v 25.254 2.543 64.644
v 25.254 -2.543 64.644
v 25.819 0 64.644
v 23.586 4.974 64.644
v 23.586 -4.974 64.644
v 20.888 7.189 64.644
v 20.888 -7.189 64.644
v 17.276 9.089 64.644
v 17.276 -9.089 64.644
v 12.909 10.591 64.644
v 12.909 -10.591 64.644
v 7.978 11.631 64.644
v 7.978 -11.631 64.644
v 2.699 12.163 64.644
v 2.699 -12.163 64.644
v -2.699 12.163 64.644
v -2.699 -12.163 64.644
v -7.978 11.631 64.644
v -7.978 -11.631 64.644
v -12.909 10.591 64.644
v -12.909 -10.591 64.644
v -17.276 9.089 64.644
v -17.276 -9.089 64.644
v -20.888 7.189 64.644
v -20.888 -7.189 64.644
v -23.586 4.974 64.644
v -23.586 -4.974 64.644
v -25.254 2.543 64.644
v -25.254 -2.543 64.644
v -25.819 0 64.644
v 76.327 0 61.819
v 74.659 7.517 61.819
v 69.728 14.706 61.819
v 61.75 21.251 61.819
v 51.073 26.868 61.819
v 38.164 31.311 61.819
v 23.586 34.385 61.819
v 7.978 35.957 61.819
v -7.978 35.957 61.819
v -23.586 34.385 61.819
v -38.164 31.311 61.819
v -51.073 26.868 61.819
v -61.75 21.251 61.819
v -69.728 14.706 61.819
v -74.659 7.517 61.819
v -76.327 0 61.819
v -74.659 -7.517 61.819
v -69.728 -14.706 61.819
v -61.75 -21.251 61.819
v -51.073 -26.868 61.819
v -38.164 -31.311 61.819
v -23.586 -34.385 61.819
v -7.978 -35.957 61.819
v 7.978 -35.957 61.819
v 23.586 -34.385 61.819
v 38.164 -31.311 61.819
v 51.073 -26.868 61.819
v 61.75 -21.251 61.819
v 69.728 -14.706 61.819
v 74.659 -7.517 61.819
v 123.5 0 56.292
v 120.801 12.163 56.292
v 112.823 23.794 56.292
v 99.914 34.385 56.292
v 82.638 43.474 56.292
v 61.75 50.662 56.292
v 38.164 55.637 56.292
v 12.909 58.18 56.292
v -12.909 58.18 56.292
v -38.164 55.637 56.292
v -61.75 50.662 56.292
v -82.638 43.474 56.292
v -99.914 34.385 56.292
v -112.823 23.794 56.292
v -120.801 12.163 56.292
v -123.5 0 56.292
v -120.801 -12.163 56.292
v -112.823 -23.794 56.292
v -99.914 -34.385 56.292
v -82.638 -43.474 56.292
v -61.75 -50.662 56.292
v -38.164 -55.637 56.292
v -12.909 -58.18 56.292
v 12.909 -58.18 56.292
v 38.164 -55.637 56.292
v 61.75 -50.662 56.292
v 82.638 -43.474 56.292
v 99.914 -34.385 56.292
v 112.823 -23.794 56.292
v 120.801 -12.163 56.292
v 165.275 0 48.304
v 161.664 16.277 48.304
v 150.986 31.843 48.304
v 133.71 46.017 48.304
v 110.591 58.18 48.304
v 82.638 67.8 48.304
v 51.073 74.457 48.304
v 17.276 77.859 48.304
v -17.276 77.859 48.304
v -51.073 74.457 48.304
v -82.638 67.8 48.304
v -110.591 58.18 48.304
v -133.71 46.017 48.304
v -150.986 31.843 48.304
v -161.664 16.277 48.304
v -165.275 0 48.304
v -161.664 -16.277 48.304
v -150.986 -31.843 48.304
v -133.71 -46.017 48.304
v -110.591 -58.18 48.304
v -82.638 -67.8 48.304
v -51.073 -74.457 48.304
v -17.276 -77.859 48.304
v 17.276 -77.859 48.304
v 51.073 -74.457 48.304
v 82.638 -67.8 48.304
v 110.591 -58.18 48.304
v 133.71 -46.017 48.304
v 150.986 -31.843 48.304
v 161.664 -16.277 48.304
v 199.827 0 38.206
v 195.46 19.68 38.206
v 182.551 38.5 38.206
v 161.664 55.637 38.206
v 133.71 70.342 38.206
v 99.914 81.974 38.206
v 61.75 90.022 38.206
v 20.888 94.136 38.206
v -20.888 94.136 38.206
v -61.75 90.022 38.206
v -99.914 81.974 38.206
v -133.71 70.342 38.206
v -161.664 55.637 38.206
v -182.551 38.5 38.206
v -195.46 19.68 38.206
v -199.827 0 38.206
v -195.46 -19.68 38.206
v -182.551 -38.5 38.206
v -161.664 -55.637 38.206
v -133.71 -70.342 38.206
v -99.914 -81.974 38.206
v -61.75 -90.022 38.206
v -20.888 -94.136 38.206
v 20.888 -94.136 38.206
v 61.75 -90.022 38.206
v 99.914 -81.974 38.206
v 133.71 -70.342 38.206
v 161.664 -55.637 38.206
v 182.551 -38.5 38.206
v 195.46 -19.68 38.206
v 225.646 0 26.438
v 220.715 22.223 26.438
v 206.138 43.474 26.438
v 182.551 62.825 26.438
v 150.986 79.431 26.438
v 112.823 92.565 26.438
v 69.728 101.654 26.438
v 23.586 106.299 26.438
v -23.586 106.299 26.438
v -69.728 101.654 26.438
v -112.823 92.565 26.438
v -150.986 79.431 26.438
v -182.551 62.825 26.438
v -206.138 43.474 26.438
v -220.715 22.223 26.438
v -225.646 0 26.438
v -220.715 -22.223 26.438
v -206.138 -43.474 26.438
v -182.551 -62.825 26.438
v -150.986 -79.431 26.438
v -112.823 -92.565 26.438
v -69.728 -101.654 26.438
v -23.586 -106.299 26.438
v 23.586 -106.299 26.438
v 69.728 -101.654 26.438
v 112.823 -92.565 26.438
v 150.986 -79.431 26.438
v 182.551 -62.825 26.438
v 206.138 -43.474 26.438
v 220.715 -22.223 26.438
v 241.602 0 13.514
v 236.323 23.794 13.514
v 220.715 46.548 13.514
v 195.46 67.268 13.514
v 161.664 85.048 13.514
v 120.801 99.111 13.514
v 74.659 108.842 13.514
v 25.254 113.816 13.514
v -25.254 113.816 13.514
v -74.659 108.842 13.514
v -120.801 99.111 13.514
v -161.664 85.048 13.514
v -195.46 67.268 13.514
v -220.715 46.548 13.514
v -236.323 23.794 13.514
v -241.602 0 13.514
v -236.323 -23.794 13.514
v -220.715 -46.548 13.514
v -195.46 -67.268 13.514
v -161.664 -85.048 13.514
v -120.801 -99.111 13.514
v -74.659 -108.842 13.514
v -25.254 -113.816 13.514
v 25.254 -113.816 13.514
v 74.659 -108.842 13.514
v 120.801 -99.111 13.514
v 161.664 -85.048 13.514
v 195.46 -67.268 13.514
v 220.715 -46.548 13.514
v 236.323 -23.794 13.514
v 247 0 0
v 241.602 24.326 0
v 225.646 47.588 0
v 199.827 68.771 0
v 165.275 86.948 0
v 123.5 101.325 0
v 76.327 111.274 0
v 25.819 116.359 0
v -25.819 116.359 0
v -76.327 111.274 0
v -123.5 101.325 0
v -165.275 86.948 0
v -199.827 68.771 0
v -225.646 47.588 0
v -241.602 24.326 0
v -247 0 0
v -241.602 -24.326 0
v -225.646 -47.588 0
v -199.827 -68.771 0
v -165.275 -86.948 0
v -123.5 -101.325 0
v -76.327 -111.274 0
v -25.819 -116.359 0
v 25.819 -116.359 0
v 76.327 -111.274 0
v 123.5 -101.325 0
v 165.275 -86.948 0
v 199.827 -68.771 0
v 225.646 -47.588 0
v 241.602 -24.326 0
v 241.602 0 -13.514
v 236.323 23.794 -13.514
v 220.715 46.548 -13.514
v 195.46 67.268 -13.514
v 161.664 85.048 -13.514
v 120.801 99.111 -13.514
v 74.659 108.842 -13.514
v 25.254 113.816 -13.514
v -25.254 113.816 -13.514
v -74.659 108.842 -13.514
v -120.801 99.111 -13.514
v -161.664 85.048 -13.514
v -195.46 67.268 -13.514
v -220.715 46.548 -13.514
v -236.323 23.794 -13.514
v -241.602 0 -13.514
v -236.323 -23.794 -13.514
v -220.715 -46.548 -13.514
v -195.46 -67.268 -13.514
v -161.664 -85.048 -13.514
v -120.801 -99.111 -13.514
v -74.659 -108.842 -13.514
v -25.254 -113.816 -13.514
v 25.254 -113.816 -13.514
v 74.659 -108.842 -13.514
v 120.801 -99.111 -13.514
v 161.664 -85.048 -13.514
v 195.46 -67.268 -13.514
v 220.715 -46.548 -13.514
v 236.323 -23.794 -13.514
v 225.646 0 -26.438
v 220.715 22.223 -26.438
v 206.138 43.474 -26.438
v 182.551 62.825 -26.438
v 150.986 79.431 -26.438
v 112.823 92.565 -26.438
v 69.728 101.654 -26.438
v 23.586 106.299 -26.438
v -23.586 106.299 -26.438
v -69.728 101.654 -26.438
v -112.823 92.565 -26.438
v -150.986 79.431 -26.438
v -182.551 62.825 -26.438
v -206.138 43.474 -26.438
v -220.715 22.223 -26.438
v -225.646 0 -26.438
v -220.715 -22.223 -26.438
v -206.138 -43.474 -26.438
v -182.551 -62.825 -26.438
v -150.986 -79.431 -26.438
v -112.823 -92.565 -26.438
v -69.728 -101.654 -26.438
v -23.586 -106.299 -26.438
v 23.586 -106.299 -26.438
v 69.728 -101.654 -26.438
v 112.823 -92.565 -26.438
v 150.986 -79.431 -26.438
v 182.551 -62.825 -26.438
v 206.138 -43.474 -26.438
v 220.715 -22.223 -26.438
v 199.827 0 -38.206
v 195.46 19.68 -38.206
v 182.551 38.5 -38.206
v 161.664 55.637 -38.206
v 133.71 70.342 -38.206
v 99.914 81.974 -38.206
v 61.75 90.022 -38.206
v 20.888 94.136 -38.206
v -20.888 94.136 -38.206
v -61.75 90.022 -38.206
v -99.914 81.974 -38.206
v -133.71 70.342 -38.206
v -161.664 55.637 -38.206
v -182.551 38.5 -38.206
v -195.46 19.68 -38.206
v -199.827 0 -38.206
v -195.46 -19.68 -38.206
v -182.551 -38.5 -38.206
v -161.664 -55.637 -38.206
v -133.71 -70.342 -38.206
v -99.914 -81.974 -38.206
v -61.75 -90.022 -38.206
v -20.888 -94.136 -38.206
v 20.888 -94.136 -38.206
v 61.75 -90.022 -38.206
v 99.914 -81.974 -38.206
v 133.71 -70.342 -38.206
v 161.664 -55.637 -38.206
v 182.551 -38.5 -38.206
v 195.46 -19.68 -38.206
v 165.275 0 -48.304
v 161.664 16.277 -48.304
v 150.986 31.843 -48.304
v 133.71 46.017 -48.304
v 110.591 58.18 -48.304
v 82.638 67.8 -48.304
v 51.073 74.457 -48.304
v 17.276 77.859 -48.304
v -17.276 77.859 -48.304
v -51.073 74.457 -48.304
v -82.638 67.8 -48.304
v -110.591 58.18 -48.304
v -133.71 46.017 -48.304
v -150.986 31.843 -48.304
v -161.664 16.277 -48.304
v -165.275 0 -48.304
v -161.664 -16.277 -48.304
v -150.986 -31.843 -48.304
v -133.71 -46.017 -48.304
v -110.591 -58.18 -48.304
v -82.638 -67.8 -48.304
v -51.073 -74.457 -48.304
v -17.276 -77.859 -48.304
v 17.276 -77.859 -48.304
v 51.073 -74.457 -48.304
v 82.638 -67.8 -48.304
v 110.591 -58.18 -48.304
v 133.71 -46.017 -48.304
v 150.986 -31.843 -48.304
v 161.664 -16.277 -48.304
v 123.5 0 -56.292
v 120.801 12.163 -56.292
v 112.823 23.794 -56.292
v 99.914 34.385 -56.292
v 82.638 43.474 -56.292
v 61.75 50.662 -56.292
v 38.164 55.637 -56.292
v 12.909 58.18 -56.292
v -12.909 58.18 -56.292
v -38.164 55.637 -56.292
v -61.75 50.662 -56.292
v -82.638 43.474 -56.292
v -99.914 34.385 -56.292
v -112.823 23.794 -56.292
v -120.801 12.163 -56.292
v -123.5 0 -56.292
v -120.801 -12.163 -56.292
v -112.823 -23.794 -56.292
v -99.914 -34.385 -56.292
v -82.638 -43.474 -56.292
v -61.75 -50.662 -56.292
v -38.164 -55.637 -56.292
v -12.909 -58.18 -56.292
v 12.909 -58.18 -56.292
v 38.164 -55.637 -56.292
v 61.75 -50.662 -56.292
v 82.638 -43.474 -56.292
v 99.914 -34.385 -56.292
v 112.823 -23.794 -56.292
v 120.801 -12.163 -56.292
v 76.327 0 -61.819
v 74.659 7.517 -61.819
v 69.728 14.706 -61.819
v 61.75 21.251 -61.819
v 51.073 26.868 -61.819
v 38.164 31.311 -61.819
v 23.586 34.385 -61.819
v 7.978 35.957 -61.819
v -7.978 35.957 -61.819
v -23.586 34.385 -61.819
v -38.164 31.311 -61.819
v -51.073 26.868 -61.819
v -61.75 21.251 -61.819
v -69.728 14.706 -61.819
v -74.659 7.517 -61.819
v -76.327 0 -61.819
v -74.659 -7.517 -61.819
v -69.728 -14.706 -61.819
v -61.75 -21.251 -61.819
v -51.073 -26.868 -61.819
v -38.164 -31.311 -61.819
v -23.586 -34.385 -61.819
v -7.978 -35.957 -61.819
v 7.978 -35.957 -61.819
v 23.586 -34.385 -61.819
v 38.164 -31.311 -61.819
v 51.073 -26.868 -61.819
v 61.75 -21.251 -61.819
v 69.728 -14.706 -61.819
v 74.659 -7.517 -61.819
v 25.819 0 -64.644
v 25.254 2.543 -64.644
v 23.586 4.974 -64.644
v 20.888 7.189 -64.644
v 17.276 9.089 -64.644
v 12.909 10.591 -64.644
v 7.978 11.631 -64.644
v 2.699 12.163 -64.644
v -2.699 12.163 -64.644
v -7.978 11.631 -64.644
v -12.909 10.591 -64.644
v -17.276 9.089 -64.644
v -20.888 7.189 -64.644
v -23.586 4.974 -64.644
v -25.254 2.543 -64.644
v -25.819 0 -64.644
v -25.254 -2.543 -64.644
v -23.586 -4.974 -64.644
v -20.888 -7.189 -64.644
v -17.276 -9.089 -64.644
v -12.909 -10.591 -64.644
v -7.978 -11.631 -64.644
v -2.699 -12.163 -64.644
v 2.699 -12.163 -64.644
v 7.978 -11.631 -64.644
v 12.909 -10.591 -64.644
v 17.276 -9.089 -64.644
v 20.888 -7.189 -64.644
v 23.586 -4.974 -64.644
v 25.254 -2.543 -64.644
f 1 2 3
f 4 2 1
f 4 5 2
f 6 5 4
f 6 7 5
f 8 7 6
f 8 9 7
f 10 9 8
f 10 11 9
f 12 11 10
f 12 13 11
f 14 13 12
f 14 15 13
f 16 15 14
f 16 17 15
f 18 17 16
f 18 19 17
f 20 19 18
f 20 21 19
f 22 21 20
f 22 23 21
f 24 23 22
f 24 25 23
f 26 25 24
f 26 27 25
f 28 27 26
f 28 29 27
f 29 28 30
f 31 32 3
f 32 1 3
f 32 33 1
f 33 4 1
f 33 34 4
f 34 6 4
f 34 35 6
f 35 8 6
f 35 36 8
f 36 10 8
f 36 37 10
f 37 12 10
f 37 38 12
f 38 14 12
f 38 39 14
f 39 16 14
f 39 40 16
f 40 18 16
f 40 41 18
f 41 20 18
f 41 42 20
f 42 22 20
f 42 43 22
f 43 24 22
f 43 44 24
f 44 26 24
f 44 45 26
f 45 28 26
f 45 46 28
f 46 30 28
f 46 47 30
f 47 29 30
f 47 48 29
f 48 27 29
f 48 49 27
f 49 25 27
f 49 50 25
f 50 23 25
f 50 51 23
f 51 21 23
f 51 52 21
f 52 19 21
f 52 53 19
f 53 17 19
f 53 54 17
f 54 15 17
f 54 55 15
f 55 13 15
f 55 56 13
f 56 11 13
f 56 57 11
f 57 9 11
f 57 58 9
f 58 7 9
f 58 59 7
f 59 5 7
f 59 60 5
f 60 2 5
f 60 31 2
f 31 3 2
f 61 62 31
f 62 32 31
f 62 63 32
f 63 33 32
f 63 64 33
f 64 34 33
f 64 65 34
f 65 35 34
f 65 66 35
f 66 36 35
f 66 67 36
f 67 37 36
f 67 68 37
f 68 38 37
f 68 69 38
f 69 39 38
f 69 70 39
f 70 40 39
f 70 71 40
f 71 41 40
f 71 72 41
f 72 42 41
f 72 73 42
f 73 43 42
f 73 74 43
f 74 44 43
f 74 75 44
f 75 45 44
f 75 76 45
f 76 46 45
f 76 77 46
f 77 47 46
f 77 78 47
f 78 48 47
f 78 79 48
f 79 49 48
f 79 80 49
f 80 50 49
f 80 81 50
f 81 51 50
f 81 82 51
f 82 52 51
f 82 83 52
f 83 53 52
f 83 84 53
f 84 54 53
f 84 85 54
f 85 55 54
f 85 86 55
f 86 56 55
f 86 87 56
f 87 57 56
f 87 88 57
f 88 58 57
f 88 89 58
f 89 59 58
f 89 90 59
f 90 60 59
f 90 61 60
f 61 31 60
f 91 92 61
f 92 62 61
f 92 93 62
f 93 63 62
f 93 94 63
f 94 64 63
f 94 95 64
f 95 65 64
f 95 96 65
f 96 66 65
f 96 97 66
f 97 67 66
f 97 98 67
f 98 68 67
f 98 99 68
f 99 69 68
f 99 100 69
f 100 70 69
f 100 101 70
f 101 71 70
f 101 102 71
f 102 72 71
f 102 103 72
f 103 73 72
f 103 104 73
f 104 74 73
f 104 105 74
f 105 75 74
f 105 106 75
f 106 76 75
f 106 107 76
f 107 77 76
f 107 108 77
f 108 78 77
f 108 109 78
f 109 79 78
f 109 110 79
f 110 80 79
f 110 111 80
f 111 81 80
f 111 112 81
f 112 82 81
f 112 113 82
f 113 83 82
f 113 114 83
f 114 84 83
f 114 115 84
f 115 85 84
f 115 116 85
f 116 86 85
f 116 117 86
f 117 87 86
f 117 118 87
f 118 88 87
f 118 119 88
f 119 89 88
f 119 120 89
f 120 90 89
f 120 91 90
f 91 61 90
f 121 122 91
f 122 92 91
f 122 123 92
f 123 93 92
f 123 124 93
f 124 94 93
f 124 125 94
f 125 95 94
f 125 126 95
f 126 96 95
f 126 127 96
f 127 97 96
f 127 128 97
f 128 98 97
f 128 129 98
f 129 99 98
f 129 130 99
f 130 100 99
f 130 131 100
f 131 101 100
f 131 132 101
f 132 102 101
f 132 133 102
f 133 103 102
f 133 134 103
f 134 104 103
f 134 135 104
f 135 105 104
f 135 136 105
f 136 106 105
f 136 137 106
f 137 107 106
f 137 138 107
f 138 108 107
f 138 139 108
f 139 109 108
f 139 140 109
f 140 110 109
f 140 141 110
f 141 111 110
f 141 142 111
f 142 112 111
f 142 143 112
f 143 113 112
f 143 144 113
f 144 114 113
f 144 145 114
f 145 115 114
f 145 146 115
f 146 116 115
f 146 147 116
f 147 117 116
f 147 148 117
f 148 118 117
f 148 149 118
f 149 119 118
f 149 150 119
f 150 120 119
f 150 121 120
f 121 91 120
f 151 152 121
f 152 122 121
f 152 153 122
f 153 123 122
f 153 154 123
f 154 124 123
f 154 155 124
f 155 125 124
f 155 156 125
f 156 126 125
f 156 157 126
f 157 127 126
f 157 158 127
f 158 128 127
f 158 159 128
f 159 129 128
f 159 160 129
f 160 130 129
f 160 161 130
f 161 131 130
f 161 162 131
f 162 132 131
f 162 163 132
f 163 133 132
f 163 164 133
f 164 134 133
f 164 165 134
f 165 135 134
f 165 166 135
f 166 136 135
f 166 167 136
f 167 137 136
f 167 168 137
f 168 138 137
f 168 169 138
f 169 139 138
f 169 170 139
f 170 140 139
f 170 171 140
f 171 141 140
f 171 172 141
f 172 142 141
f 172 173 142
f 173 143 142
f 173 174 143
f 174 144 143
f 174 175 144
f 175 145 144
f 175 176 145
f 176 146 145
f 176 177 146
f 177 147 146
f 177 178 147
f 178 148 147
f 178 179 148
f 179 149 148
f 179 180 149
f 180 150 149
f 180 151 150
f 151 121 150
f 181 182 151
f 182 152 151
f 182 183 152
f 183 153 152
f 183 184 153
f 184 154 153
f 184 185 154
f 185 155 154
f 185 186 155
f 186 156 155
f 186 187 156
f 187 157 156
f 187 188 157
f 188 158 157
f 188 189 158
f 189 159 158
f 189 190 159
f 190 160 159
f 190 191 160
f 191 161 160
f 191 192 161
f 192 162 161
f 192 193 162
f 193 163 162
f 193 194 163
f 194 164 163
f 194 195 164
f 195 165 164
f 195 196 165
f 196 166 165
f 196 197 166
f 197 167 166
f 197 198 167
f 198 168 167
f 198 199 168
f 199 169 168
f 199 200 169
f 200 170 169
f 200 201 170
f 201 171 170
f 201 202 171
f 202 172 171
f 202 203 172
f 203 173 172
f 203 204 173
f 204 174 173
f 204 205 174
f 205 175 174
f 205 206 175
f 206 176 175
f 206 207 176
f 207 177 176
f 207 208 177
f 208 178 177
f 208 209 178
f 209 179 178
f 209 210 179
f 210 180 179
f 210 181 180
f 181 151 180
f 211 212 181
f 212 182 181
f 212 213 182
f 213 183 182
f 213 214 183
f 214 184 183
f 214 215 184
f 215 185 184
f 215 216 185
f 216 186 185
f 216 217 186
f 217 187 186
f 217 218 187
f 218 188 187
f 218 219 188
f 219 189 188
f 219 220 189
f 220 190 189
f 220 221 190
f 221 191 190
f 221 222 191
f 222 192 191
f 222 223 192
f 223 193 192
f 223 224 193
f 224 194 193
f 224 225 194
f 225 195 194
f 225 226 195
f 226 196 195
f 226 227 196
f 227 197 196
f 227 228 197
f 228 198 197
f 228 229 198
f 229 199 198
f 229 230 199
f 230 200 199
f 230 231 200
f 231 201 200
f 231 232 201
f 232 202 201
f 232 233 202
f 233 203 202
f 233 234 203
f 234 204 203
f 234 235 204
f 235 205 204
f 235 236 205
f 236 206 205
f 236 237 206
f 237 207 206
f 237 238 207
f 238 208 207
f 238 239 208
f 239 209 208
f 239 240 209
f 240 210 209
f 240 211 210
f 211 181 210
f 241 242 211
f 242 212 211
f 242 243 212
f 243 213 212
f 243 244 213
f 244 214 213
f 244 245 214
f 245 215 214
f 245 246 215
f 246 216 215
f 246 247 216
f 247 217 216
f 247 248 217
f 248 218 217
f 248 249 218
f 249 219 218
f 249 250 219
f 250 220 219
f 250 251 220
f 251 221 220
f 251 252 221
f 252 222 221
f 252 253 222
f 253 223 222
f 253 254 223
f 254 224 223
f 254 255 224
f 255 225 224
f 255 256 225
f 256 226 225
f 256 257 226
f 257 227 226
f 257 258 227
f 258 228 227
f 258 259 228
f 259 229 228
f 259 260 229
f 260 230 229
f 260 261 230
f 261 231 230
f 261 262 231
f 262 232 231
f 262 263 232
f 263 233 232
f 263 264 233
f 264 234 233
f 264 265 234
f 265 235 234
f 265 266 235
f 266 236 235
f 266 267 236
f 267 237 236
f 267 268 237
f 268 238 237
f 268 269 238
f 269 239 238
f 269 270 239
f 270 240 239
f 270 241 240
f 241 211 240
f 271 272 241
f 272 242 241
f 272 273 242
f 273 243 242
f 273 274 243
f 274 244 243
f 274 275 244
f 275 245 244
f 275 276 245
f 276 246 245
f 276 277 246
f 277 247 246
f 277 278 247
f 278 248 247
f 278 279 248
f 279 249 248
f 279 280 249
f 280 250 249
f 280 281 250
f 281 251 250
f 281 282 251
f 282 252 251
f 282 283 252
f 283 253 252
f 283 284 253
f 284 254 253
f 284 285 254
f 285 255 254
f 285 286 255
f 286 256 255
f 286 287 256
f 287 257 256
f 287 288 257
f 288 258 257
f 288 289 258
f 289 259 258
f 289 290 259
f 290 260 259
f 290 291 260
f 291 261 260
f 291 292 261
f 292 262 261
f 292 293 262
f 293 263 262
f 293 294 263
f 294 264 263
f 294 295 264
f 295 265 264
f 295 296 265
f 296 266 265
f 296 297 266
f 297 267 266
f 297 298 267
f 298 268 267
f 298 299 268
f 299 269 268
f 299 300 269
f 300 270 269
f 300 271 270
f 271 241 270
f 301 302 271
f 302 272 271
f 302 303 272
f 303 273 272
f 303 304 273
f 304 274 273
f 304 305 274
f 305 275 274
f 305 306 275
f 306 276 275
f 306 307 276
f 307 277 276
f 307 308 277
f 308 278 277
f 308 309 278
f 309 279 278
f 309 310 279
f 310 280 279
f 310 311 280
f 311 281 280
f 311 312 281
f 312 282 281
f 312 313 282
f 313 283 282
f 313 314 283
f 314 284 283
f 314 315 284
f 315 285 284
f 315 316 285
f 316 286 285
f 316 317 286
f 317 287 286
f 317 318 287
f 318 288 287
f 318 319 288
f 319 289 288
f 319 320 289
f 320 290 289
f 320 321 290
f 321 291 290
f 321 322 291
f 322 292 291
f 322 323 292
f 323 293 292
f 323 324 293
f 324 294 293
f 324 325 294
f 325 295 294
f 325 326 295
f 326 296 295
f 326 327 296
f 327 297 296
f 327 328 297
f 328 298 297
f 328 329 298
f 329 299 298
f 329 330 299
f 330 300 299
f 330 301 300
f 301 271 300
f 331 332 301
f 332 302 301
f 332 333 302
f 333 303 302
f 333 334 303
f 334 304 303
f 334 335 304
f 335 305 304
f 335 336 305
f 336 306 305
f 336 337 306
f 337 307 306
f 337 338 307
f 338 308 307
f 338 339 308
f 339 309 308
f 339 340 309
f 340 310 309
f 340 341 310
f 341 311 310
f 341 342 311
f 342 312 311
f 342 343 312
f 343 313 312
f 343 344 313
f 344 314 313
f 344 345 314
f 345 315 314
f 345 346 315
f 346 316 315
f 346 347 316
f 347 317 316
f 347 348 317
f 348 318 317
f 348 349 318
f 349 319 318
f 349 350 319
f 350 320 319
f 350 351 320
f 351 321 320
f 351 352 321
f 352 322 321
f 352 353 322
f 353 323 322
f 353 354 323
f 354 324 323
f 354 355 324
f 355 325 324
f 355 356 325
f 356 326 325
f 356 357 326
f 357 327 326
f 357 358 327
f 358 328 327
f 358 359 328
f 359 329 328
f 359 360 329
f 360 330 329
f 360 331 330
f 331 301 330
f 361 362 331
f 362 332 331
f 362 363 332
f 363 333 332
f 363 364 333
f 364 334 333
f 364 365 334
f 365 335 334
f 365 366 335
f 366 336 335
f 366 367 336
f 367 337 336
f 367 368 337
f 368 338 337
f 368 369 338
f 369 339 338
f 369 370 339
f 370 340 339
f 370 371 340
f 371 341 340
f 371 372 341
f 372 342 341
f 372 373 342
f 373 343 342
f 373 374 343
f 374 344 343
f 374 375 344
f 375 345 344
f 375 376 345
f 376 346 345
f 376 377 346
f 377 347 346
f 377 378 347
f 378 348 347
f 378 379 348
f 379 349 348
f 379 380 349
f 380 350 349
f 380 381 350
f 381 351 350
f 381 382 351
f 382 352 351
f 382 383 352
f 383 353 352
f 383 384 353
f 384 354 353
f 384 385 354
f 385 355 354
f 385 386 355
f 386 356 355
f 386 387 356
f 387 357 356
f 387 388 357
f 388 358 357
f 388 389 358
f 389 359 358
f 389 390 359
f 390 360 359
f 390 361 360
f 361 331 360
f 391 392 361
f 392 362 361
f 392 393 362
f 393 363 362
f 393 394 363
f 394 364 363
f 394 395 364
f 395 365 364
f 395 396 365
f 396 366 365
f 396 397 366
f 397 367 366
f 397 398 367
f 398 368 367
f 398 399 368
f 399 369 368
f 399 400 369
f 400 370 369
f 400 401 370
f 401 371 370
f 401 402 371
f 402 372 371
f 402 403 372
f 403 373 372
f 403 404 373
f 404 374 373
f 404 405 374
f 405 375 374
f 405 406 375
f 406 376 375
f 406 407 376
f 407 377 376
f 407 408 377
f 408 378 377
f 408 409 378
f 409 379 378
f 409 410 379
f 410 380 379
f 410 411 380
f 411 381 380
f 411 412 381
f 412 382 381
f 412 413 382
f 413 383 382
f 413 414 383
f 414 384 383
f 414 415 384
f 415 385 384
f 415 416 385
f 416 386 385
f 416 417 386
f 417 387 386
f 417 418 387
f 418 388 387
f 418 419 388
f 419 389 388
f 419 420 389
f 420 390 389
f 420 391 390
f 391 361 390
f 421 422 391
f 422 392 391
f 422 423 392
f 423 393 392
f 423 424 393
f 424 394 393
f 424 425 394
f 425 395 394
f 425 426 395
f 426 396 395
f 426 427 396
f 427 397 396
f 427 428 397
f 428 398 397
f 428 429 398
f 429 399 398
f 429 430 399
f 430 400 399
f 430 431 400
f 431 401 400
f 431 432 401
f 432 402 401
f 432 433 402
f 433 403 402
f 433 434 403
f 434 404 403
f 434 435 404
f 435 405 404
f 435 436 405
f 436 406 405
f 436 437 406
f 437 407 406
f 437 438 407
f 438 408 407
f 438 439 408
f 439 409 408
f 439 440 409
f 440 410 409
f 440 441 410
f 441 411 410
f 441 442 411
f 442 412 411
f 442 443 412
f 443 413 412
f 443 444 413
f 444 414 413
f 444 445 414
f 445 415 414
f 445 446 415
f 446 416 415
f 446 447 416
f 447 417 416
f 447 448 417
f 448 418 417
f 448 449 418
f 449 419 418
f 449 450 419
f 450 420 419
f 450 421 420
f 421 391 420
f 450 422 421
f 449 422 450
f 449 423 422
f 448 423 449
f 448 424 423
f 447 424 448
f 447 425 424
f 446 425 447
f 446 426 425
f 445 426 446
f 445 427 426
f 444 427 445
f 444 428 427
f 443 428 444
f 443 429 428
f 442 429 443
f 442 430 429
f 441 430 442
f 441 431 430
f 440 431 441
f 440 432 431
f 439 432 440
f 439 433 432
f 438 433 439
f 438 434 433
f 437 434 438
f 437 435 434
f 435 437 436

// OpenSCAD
// Generated by SolidPython 1.0.1 on 2020-07-29 00:46:53


scale(v = [19, 9, 5]) {
	sphere(r = 13);
}
/***********************************************
*********      SolidPython code:      **********
************************************************
 
# import packages: SolidPython
from solid import *
from solid.utils import *
from itertools import chain, combinations, permutations


class Resize:

    def __init__(self, scad_file):
        self.scad_file = scad_file
        #self.scad_file = import_scad(scad_file)
        # cone/cylinder param:
        self.r1 = 0
        self.r2 = 0
        self.h = 0
        # rectangular prism param:
        self.w = 0
        self.l = 0
        # ellipse param:
        self.r = 0

    # import OpenScad code (file name corresponds to shape)


    # classify shape + parameters
    def assign(self, param1, param2, param3):
        if self.scad_file == 'cone.scad':
            self.r1 = param1
            self.r2 = param2
            self.h = param3
        elif self.scad_file == 'cylinder.scad':
            self.r1 = param1
            self.r2 = param2
            self.h = param3
        elif self.scad_file == 'rectangularPrism.scad':
            self.h = param1
            self.l = param2
            self.w = param3
        else:
            self.r = param1
            self.h = param2

    # resize parameters
    def iterate(self):
        x = range(3, 20, 2)
        i = 1
        if self.scad_file == 'cone.scad':
            tempList = list(permutations(x, 2))
            for temp in tempList:
                param1 = temp[0]
                param2 = temp[1]
                filepath = 'produced_scad_files/' + 'cone' + str(param1) + '_' + str(param2) + '_' + '.scad'
                scad_render_to_file(cylinder(h=param1, r1=param2, r2=0), filepath)

        elif self.scad_file == 'cylinder.scad':
            tempList = list(permutations(x, 3))
            for temp in tempList:
                param1 = temp[0]
                param2 = temp[1]
                filepath = 'produced_scad_files/' + 'cylinder' + str(param1) + '_' + str(param2) + '_' + '.scad'
                scad_render_to_file(cylinder(h=param1, r1=param2, r2=param2), filepath)

        elif self.scad_file == 'rectangularPrism.scad':
            tempList = list(permutations(x, 3))
            for temp in tempList:
                param1 = temp[0]
                param2 = temp[1]
                param3 = temp[2]
                filepath = 'produced_scad_files/' + 'rectangularPrism' + str(param1) + '_' + str(param2) + '_' + str(
                    param3) + '.scad'
                scad_render_to_file(cube(size=(param1, param2, param3)), filepath)

        elif self.scad_file == 'ellipse.scad':
            tempList = list(permutations(x, 4))
            for temp in tempList:
                param1 = temp[0]
                param2 = temp[1]
                param3 = temp[2]
                param4 = temp[3]
                filepath = 'produced_scad_files/' + 'ellipse' + str(param1) + '_' + str(param2) + '_' + str(param3) + '_' + str(param4) + '.scad'
                scad_render_to_file(scale([param1, param2, param3])(sphere(r=param4)), filepath)

    def render_to_scadfile(self):
        scad_render_to_file(scad, 'example.scad') 
 
************************************************/
